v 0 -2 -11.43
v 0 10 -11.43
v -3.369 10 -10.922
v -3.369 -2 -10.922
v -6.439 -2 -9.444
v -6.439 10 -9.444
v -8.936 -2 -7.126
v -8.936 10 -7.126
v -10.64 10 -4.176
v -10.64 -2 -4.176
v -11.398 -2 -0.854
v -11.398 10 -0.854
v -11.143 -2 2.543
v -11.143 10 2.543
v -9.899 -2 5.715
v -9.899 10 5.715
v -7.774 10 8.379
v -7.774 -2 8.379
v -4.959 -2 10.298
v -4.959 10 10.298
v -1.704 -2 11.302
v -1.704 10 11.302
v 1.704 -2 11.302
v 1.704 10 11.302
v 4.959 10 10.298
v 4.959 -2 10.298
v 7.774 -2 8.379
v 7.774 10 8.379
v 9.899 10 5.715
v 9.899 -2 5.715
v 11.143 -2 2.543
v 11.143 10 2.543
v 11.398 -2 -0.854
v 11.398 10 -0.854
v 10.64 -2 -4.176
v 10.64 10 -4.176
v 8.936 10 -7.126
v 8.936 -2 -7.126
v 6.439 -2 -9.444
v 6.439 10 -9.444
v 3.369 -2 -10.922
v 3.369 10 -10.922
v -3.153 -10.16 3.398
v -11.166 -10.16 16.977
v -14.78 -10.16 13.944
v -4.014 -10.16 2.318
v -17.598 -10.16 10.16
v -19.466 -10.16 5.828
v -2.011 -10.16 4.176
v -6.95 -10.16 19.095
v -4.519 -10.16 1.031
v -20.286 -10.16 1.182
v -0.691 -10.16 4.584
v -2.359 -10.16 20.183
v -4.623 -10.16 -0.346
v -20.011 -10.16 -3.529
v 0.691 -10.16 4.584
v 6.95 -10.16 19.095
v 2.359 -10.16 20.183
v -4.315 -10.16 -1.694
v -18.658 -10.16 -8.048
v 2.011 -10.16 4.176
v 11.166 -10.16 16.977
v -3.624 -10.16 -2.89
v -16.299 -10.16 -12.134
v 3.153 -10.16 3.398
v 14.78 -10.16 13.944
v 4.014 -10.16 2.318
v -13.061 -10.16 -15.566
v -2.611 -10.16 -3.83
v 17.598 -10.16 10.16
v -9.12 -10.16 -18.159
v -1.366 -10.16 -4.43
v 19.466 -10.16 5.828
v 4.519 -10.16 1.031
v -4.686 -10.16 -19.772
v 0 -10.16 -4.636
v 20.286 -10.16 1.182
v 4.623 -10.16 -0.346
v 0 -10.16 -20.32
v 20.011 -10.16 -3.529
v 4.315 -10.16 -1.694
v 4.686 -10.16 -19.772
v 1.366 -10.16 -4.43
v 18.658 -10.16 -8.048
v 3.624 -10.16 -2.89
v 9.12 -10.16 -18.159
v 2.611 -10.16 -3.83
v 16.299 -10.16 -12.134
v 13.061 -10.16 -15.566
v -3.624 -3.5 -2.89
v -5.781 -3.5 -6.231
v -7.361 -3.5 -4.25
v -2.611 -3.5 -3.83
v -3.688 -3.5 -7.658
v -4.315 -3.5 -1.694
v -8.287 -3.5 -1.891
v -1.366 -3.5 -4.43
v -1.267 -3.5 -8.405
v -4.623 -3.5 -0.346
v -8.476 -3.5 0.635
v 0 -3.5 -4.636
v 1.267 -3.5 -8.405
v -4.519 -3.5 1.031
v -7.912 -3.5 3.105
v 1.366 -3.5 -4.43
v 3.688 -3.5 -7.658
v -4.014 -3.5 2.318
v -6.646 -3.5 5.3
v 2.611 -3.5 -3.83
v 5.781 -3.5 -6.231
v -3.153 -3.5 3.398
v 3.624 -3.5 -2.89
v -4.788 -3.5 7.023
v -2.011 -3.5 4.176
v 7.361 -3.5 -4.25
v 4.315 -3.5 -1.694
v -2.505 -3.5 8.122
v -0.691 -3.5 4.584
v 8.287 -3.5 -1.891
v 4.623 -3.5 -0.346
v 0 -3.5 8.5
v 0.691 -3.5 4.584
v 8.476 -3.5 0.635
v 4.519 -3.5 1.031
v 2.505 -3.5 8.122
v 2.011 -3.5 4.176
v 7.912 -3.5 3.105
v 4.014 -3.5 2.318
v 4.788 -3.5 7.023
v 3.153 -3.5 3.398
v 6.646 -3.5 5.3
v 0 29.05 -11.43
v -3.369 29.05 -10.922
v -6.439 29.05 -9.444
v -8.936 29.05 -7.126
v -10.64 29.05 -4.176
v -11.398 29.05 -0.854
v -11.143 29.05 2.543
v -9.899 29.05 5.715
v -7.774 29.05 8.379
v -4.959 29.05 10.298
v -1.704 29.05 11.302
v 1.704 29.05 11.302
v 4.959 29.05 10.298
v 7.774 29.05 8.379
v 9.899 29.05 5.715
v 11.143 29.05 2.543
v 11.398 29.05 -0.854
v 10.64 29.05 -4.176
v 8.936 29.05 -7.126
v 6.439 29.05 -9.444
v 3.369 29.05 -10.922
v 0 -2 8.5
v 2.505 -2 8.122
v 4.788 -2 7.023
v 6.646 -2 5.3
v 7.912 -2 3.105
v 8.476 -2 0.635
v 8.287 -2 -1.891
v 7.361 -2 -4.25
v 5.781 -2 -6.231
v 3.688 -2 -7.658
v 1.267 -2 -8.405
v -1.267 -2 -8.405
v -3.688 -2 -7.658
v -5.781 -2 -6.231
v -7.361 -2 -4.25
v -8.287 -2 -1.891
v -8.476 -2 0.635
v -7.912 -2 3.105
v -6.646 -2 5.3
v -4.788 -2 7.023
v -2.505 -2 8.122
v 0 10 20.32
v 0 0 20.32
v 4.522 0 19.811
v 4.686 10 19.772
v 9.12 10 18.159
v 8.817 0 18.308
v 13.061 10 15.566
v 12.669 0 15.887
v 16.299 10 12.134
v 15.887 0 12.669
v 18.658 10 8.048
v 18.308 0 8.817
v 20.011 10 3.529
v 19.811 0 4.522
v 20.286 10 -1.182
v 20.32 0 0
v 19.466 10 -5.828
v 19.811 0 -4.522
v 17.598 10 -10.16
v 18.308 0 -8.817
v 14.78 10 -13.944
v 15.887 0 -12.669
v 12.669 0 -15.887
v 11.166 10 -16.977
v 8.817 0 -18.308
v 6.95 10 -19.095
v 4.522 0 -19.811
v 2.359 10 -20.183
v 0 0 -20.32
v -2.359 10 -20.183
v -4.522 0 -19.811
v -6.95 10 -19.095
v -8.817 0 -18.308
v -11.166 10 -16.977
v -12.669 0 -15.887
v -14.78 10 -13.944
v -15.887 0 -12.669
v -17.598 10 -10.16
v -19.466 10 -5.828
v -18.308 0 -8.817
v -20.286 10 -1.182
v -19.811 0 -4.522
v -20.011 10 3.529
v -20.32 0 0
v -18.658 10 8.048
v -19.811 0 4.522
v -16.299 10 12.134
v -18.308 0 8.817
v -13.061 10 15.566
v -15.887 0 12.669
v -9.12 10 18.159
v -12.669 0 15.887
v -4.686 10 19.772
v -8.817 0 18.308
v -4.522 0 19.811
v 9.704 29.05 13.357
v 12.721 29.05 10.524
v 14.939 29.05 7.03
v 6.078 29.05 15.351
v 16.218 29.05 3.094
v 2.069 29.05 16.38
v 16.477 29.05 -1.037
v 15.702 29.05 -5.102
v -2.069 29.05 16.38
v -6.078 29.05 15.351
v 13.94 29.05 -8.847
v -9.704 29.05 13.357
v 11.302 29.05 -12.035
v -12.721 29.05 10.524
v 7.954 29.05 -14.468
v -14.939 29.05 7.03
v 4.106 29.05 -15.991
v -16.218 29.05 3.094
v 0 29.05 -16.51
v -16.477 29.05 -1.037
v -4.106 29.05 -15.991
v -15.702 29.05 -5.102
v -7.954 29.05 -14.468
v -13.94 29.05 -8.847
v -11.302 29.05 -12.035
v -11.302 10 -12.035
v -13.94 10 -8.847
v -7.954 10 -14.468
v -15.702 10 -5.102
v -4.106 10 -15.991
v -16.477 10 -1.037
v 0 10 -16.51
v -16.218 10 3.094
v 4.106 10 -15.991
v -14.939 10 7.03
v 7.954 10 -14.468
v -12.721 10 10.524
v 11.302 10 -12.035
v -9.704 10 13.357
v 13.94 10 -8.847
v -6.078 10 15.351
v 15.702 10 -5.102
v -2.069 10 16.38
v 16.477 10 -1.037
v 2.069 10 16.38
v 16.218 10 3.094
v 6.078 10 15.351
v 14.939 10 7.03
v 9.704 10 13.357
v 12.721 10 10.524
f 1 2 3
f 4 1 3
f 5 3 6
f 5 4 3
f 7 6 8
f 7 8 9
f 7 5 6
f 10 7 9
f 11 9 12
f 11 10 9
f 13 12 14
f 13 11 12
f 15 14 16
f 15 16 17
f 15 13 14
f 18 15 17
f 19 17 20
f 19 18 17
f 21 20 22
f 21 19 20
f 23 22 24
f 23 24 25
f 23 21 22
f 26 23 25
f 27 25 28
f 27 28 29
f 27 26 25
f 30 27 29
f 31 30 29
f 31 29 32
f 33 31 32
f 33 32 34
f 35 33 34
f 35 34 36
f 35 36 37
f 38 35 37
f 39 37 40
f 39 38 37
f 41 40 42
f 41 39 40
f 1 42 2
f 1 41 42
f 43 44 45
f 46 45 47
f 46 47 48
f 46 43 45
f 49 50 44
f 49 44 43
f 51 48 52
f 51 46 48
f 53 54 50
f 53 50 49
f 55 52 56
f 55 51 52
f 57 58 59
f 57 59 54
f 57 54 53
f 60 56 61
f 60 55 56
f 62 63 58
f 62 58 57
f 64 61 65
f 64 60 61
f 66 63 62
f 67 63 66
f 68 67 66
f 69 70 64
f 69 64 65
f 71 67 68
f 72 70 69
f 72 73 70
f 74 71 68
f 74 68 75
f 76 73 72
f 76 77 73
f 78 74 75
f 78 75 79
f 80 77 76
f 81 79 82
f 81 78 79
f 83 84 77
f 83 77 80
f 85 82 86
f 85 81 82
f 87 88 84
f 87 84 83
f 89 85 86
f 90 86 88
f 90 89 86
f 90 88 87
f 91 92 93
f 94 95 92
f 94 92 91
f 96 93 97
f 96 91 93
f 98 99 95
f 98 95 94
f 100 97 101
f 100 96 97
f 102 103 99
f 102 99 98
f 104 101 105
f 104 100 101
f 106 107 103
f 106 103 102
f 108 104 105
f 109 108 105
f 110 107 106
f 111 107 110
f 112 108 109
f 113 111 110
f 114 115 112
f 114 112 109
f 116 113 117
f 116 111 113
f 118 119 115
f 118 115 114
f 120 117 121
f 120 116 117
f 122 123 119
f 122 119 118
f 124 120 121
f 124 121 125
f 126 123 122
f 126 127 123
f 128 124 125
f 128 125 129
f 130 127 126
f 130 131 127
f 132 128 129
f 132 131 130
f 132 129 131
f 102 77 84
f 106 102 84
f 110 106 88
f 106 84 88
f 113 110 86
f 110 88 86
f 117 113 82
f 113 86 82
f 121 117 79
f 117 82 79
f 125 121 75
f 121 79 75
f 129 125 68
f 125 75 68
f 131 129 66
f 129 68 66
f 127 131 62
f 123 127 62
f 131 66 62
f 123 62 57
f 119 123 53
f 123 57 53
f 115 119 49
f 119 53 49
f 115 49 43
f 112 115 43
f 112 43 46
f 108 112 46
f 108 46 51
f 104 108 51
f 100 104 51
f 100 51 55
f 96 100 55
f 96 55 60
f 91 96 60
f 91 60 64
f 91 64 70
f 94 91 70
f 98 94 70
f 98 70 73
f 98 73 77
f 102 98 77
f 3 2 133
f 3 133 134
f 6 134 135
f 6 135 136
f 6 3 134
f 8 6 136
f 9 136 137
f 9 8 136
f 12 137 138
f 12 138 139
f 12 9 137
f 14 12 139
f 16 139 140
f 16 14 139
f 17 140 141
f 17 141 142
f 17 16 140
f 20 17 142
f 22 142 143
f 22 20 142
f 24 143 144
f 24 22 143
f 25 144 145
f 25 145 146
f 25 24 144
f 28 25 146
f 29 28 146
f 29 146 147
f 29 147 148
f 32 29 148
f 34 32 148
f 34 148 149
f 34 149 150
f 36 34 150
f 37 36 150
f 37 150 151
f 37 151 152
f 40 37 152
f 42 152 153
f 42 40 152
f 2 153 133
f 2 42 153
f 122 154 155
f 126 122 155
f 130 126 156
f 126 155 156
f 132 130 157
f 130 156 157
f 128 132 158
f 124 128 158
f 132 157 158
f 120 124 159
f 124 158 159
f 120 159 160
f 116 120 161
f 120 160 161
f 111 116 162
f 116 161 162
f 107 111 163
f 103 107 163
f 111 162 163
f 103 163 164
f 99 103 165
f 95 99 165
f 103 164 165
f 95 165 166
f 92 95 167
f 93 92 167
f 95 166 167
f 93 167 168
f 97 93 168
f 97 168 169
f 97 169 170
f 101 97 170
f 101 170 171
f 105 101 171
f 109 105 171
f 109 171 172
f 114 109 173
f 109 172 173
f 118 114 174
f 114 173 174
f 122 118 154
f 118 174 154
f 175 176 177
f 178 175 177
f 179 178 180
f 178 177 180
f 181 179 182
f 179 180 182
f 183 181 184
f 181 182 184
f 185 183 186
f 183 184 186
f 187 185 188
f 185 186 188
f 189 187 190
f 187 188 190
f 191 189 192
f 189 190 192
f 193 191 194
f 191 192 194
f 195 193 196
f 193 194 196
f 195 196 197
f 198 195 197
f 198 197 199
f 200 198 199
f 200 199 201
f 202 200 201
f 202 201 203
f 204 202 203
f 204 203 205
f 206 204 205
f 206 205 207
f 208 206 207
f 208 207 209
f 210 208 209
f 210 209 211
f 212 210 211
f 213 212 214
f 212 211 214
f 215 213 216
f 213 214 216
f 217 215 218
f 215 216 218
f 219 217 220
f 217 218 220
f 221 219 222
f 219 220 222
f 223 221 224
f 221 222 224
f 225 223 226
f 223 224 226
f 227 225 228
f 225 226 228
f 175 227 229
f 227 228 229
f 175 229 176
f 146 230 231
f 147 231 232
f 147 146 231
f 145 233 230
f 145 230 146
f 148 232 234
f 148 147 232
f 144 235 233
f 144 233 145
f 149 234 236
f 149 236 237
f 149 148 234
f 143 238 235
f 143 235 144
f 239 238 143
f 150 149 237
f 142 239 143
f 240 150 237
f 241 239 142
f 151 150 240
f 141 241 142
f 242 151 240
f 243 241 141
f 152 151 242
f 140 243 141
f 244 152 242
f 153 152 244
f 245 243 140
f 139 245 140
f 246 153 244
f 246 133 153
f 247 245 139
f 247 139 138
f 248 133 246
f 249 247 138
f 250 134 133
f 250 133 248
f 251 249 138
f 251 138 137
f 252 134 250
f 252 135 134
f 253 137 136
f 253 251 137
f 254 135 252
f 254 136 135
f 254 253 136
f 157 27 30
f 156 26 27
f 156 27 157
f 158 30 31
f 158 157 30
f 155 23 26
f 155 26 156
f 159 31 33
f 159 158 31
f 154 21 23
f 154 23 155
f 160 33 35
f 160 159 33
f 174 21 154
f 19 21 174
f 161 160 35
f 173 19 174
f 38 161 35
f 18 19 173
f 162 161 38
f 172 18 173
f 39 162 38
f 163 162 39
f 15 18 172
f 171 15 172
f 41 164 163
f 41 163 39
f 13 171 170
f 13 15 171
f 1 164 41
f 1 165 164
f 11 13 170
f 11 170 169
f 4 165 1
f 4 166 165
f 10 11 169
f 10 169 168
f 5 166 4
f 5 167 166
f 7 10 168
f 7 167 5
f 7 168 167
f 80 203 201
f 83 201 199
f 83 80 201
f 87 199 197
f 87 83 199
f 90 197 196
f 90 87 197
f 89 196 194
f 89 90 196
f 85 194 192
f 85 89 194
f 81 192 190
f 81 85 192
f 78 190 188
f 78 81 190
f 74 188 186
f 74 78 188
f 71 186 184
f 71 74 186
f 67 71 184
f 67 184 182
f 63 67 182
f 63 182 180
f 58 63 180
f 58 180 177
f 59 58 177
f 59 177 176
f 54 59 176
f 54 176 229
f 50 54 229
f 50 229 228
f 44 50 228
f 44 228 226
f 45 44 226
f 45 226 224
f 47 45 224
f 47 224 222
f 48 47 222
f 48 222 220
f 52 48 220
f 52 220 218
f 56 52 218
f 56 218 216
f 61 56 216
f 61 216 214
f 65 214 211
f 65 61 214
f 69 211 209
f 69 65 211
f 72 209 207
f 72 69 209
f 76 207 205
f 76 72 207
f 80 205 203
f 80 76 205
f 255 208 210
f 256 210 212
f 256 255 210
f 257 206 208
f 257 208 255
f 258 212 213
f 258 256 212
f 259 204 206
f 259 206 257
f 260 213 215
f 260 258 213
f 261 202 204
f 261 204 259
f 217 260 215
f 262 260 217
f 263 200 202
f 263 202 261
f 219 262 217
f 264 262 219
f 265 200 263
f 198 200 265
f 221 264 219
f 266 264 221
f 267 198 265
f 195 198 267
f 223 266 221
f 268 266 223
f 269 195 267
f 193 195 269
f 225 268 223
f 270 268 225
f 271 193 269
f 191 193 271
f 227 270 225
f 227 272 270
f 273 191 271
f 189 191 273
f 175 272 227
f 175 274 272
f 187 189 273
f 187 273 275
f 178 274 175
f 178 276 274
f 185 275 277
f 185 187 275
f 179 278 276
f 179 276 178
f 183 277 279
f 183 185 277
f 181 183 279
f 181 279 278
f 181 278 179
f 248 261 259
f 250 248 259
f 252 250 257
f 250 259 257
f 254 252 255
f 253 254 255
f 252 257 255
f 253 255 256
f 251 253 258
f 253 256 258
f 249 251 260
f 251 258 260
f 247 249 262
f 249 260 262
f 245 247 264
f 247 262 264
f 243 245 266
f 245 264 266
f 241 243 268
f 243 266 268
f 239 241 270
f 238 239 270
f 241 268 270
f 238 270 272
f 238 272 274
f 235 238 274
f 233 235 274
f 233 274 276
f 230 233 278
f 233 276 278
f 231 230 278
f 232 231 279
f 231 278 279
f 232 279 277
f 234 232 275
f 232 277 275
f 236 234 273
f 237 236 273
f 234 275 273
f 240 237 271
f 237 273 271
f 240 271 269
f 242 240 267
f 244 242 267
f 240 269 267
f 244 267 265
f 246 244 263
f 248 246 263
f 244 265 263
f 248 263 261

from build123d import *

# Parameters (mm, degrees)
SKETCH1_R           = 20.32
SKETCH1_R_2         = 4.6355
BOSS_EXTRUDE1_DEPTH = 10
SKETCH2_R           = 16.51
SKETCH2_R_2         = 11.43
BOSS_EXTRUDE2_DEPTH = 19.05
BOSS_EXTRUDE3_START = 10.16
SKETCH3_R           = 20.32
SKETCH3_R_2         = 4.6355
BOSS_EXTRUDE3_DEPTH = 10.16
CUT_EXTRUDE1_START  = -12
SKETCH4_R           = 11.43
CUT_EXTRUDE1_DEPTH  = 12
SKETCH5_R           = 8.5
CUT_EXTRUDE2_DEPTH  = 1.5


with BuildPart() as part:
    # Sketch1 → Boss-Extrude1 (new body)
    with BuildSketch(Plane(origin=(0, 0, 0), x_dir=(1, 0, 0), z_dir=(0, 1, 0))):
        with Locations(Location((0, 0, 0), (0, 0, 270))):
            Circle(SKETCH1_R)
        with Locations(Location((0, 0, 0), (0, 0, 270))):
            Circle(SKETCH1_R_2, mode=Mode.SUBTRACT)
    extrude(amount=BOSS_EXTRUDE1_DEPTH)

    # Sketch2 → Boss-Extrude2 (add)
    with BuildSketch(Plane(origin=(0, 10, 0), x_dir=(1, 0, 0), z_dir=(0, 1, 0))):
        with Locations(Location((0, 0, 0), (0, 0, 90))):
            Circle(SKETCH2_R)
        with Locations(Location((0, 0, 0), (0, 0, 90))):
            Circle(SKETCH2_R_2, mode=Mode.SUBTRACT)
    extrude(amount=BOSS_EXTRUDE2_DEPTH)

    # Sketch3 → Boss-Extrude3 (add)
    with BuildSketch(Plane(origin=(0, 0, 0), x_dir=(-1, 0, 0), z_dir=(0, -1, 0)).offset(BOSS_EXTRUDE3_START)):
        with Locations(Location((0, 0, 0), (0, 0, 90))):
            Circle(SKETCH3_R)
        with Locations(Location((0, 0, 0), (0, 0, 90))):
            Circle(SKETCH3_R_2, mode=Mode.SUBTRACT)
    extrude(amount=-BOSS_EXTRUDE3_DEPTH)

    # Sketch4 → Cut-Extrude1 (cut)
    with BuildSketch(Plane(origin=(0, 10, 0), x_dir=(1, 0, 0), z_dir=(0, 1, 0)).offset(CUT_EXTRUDE1_START)):
        with Locations(Location((0, 0, 0), (0, 0, 90))):
            Circle(SKETCH4_R)
    extrude(amount=CUT_EXTRUDE1_DEPTH, mode=Mode.SUBTRACT)

    # Sketch5 → Cut-Extrude2 (cut)
    with BuildSketch(Plane(origin=(0, -2, 0), x_dir=(1, 0, 0), z_dir=(0, 1, 0))):
        with Locations(Location((0, 0, 0), (0, 0, 270))):
            Circle(SKETCH5_R)
    extrude(amount=-CUT_EXTRUDE2_DEPTH, mode=Mode.SUBTRACT)


solid = part.part
